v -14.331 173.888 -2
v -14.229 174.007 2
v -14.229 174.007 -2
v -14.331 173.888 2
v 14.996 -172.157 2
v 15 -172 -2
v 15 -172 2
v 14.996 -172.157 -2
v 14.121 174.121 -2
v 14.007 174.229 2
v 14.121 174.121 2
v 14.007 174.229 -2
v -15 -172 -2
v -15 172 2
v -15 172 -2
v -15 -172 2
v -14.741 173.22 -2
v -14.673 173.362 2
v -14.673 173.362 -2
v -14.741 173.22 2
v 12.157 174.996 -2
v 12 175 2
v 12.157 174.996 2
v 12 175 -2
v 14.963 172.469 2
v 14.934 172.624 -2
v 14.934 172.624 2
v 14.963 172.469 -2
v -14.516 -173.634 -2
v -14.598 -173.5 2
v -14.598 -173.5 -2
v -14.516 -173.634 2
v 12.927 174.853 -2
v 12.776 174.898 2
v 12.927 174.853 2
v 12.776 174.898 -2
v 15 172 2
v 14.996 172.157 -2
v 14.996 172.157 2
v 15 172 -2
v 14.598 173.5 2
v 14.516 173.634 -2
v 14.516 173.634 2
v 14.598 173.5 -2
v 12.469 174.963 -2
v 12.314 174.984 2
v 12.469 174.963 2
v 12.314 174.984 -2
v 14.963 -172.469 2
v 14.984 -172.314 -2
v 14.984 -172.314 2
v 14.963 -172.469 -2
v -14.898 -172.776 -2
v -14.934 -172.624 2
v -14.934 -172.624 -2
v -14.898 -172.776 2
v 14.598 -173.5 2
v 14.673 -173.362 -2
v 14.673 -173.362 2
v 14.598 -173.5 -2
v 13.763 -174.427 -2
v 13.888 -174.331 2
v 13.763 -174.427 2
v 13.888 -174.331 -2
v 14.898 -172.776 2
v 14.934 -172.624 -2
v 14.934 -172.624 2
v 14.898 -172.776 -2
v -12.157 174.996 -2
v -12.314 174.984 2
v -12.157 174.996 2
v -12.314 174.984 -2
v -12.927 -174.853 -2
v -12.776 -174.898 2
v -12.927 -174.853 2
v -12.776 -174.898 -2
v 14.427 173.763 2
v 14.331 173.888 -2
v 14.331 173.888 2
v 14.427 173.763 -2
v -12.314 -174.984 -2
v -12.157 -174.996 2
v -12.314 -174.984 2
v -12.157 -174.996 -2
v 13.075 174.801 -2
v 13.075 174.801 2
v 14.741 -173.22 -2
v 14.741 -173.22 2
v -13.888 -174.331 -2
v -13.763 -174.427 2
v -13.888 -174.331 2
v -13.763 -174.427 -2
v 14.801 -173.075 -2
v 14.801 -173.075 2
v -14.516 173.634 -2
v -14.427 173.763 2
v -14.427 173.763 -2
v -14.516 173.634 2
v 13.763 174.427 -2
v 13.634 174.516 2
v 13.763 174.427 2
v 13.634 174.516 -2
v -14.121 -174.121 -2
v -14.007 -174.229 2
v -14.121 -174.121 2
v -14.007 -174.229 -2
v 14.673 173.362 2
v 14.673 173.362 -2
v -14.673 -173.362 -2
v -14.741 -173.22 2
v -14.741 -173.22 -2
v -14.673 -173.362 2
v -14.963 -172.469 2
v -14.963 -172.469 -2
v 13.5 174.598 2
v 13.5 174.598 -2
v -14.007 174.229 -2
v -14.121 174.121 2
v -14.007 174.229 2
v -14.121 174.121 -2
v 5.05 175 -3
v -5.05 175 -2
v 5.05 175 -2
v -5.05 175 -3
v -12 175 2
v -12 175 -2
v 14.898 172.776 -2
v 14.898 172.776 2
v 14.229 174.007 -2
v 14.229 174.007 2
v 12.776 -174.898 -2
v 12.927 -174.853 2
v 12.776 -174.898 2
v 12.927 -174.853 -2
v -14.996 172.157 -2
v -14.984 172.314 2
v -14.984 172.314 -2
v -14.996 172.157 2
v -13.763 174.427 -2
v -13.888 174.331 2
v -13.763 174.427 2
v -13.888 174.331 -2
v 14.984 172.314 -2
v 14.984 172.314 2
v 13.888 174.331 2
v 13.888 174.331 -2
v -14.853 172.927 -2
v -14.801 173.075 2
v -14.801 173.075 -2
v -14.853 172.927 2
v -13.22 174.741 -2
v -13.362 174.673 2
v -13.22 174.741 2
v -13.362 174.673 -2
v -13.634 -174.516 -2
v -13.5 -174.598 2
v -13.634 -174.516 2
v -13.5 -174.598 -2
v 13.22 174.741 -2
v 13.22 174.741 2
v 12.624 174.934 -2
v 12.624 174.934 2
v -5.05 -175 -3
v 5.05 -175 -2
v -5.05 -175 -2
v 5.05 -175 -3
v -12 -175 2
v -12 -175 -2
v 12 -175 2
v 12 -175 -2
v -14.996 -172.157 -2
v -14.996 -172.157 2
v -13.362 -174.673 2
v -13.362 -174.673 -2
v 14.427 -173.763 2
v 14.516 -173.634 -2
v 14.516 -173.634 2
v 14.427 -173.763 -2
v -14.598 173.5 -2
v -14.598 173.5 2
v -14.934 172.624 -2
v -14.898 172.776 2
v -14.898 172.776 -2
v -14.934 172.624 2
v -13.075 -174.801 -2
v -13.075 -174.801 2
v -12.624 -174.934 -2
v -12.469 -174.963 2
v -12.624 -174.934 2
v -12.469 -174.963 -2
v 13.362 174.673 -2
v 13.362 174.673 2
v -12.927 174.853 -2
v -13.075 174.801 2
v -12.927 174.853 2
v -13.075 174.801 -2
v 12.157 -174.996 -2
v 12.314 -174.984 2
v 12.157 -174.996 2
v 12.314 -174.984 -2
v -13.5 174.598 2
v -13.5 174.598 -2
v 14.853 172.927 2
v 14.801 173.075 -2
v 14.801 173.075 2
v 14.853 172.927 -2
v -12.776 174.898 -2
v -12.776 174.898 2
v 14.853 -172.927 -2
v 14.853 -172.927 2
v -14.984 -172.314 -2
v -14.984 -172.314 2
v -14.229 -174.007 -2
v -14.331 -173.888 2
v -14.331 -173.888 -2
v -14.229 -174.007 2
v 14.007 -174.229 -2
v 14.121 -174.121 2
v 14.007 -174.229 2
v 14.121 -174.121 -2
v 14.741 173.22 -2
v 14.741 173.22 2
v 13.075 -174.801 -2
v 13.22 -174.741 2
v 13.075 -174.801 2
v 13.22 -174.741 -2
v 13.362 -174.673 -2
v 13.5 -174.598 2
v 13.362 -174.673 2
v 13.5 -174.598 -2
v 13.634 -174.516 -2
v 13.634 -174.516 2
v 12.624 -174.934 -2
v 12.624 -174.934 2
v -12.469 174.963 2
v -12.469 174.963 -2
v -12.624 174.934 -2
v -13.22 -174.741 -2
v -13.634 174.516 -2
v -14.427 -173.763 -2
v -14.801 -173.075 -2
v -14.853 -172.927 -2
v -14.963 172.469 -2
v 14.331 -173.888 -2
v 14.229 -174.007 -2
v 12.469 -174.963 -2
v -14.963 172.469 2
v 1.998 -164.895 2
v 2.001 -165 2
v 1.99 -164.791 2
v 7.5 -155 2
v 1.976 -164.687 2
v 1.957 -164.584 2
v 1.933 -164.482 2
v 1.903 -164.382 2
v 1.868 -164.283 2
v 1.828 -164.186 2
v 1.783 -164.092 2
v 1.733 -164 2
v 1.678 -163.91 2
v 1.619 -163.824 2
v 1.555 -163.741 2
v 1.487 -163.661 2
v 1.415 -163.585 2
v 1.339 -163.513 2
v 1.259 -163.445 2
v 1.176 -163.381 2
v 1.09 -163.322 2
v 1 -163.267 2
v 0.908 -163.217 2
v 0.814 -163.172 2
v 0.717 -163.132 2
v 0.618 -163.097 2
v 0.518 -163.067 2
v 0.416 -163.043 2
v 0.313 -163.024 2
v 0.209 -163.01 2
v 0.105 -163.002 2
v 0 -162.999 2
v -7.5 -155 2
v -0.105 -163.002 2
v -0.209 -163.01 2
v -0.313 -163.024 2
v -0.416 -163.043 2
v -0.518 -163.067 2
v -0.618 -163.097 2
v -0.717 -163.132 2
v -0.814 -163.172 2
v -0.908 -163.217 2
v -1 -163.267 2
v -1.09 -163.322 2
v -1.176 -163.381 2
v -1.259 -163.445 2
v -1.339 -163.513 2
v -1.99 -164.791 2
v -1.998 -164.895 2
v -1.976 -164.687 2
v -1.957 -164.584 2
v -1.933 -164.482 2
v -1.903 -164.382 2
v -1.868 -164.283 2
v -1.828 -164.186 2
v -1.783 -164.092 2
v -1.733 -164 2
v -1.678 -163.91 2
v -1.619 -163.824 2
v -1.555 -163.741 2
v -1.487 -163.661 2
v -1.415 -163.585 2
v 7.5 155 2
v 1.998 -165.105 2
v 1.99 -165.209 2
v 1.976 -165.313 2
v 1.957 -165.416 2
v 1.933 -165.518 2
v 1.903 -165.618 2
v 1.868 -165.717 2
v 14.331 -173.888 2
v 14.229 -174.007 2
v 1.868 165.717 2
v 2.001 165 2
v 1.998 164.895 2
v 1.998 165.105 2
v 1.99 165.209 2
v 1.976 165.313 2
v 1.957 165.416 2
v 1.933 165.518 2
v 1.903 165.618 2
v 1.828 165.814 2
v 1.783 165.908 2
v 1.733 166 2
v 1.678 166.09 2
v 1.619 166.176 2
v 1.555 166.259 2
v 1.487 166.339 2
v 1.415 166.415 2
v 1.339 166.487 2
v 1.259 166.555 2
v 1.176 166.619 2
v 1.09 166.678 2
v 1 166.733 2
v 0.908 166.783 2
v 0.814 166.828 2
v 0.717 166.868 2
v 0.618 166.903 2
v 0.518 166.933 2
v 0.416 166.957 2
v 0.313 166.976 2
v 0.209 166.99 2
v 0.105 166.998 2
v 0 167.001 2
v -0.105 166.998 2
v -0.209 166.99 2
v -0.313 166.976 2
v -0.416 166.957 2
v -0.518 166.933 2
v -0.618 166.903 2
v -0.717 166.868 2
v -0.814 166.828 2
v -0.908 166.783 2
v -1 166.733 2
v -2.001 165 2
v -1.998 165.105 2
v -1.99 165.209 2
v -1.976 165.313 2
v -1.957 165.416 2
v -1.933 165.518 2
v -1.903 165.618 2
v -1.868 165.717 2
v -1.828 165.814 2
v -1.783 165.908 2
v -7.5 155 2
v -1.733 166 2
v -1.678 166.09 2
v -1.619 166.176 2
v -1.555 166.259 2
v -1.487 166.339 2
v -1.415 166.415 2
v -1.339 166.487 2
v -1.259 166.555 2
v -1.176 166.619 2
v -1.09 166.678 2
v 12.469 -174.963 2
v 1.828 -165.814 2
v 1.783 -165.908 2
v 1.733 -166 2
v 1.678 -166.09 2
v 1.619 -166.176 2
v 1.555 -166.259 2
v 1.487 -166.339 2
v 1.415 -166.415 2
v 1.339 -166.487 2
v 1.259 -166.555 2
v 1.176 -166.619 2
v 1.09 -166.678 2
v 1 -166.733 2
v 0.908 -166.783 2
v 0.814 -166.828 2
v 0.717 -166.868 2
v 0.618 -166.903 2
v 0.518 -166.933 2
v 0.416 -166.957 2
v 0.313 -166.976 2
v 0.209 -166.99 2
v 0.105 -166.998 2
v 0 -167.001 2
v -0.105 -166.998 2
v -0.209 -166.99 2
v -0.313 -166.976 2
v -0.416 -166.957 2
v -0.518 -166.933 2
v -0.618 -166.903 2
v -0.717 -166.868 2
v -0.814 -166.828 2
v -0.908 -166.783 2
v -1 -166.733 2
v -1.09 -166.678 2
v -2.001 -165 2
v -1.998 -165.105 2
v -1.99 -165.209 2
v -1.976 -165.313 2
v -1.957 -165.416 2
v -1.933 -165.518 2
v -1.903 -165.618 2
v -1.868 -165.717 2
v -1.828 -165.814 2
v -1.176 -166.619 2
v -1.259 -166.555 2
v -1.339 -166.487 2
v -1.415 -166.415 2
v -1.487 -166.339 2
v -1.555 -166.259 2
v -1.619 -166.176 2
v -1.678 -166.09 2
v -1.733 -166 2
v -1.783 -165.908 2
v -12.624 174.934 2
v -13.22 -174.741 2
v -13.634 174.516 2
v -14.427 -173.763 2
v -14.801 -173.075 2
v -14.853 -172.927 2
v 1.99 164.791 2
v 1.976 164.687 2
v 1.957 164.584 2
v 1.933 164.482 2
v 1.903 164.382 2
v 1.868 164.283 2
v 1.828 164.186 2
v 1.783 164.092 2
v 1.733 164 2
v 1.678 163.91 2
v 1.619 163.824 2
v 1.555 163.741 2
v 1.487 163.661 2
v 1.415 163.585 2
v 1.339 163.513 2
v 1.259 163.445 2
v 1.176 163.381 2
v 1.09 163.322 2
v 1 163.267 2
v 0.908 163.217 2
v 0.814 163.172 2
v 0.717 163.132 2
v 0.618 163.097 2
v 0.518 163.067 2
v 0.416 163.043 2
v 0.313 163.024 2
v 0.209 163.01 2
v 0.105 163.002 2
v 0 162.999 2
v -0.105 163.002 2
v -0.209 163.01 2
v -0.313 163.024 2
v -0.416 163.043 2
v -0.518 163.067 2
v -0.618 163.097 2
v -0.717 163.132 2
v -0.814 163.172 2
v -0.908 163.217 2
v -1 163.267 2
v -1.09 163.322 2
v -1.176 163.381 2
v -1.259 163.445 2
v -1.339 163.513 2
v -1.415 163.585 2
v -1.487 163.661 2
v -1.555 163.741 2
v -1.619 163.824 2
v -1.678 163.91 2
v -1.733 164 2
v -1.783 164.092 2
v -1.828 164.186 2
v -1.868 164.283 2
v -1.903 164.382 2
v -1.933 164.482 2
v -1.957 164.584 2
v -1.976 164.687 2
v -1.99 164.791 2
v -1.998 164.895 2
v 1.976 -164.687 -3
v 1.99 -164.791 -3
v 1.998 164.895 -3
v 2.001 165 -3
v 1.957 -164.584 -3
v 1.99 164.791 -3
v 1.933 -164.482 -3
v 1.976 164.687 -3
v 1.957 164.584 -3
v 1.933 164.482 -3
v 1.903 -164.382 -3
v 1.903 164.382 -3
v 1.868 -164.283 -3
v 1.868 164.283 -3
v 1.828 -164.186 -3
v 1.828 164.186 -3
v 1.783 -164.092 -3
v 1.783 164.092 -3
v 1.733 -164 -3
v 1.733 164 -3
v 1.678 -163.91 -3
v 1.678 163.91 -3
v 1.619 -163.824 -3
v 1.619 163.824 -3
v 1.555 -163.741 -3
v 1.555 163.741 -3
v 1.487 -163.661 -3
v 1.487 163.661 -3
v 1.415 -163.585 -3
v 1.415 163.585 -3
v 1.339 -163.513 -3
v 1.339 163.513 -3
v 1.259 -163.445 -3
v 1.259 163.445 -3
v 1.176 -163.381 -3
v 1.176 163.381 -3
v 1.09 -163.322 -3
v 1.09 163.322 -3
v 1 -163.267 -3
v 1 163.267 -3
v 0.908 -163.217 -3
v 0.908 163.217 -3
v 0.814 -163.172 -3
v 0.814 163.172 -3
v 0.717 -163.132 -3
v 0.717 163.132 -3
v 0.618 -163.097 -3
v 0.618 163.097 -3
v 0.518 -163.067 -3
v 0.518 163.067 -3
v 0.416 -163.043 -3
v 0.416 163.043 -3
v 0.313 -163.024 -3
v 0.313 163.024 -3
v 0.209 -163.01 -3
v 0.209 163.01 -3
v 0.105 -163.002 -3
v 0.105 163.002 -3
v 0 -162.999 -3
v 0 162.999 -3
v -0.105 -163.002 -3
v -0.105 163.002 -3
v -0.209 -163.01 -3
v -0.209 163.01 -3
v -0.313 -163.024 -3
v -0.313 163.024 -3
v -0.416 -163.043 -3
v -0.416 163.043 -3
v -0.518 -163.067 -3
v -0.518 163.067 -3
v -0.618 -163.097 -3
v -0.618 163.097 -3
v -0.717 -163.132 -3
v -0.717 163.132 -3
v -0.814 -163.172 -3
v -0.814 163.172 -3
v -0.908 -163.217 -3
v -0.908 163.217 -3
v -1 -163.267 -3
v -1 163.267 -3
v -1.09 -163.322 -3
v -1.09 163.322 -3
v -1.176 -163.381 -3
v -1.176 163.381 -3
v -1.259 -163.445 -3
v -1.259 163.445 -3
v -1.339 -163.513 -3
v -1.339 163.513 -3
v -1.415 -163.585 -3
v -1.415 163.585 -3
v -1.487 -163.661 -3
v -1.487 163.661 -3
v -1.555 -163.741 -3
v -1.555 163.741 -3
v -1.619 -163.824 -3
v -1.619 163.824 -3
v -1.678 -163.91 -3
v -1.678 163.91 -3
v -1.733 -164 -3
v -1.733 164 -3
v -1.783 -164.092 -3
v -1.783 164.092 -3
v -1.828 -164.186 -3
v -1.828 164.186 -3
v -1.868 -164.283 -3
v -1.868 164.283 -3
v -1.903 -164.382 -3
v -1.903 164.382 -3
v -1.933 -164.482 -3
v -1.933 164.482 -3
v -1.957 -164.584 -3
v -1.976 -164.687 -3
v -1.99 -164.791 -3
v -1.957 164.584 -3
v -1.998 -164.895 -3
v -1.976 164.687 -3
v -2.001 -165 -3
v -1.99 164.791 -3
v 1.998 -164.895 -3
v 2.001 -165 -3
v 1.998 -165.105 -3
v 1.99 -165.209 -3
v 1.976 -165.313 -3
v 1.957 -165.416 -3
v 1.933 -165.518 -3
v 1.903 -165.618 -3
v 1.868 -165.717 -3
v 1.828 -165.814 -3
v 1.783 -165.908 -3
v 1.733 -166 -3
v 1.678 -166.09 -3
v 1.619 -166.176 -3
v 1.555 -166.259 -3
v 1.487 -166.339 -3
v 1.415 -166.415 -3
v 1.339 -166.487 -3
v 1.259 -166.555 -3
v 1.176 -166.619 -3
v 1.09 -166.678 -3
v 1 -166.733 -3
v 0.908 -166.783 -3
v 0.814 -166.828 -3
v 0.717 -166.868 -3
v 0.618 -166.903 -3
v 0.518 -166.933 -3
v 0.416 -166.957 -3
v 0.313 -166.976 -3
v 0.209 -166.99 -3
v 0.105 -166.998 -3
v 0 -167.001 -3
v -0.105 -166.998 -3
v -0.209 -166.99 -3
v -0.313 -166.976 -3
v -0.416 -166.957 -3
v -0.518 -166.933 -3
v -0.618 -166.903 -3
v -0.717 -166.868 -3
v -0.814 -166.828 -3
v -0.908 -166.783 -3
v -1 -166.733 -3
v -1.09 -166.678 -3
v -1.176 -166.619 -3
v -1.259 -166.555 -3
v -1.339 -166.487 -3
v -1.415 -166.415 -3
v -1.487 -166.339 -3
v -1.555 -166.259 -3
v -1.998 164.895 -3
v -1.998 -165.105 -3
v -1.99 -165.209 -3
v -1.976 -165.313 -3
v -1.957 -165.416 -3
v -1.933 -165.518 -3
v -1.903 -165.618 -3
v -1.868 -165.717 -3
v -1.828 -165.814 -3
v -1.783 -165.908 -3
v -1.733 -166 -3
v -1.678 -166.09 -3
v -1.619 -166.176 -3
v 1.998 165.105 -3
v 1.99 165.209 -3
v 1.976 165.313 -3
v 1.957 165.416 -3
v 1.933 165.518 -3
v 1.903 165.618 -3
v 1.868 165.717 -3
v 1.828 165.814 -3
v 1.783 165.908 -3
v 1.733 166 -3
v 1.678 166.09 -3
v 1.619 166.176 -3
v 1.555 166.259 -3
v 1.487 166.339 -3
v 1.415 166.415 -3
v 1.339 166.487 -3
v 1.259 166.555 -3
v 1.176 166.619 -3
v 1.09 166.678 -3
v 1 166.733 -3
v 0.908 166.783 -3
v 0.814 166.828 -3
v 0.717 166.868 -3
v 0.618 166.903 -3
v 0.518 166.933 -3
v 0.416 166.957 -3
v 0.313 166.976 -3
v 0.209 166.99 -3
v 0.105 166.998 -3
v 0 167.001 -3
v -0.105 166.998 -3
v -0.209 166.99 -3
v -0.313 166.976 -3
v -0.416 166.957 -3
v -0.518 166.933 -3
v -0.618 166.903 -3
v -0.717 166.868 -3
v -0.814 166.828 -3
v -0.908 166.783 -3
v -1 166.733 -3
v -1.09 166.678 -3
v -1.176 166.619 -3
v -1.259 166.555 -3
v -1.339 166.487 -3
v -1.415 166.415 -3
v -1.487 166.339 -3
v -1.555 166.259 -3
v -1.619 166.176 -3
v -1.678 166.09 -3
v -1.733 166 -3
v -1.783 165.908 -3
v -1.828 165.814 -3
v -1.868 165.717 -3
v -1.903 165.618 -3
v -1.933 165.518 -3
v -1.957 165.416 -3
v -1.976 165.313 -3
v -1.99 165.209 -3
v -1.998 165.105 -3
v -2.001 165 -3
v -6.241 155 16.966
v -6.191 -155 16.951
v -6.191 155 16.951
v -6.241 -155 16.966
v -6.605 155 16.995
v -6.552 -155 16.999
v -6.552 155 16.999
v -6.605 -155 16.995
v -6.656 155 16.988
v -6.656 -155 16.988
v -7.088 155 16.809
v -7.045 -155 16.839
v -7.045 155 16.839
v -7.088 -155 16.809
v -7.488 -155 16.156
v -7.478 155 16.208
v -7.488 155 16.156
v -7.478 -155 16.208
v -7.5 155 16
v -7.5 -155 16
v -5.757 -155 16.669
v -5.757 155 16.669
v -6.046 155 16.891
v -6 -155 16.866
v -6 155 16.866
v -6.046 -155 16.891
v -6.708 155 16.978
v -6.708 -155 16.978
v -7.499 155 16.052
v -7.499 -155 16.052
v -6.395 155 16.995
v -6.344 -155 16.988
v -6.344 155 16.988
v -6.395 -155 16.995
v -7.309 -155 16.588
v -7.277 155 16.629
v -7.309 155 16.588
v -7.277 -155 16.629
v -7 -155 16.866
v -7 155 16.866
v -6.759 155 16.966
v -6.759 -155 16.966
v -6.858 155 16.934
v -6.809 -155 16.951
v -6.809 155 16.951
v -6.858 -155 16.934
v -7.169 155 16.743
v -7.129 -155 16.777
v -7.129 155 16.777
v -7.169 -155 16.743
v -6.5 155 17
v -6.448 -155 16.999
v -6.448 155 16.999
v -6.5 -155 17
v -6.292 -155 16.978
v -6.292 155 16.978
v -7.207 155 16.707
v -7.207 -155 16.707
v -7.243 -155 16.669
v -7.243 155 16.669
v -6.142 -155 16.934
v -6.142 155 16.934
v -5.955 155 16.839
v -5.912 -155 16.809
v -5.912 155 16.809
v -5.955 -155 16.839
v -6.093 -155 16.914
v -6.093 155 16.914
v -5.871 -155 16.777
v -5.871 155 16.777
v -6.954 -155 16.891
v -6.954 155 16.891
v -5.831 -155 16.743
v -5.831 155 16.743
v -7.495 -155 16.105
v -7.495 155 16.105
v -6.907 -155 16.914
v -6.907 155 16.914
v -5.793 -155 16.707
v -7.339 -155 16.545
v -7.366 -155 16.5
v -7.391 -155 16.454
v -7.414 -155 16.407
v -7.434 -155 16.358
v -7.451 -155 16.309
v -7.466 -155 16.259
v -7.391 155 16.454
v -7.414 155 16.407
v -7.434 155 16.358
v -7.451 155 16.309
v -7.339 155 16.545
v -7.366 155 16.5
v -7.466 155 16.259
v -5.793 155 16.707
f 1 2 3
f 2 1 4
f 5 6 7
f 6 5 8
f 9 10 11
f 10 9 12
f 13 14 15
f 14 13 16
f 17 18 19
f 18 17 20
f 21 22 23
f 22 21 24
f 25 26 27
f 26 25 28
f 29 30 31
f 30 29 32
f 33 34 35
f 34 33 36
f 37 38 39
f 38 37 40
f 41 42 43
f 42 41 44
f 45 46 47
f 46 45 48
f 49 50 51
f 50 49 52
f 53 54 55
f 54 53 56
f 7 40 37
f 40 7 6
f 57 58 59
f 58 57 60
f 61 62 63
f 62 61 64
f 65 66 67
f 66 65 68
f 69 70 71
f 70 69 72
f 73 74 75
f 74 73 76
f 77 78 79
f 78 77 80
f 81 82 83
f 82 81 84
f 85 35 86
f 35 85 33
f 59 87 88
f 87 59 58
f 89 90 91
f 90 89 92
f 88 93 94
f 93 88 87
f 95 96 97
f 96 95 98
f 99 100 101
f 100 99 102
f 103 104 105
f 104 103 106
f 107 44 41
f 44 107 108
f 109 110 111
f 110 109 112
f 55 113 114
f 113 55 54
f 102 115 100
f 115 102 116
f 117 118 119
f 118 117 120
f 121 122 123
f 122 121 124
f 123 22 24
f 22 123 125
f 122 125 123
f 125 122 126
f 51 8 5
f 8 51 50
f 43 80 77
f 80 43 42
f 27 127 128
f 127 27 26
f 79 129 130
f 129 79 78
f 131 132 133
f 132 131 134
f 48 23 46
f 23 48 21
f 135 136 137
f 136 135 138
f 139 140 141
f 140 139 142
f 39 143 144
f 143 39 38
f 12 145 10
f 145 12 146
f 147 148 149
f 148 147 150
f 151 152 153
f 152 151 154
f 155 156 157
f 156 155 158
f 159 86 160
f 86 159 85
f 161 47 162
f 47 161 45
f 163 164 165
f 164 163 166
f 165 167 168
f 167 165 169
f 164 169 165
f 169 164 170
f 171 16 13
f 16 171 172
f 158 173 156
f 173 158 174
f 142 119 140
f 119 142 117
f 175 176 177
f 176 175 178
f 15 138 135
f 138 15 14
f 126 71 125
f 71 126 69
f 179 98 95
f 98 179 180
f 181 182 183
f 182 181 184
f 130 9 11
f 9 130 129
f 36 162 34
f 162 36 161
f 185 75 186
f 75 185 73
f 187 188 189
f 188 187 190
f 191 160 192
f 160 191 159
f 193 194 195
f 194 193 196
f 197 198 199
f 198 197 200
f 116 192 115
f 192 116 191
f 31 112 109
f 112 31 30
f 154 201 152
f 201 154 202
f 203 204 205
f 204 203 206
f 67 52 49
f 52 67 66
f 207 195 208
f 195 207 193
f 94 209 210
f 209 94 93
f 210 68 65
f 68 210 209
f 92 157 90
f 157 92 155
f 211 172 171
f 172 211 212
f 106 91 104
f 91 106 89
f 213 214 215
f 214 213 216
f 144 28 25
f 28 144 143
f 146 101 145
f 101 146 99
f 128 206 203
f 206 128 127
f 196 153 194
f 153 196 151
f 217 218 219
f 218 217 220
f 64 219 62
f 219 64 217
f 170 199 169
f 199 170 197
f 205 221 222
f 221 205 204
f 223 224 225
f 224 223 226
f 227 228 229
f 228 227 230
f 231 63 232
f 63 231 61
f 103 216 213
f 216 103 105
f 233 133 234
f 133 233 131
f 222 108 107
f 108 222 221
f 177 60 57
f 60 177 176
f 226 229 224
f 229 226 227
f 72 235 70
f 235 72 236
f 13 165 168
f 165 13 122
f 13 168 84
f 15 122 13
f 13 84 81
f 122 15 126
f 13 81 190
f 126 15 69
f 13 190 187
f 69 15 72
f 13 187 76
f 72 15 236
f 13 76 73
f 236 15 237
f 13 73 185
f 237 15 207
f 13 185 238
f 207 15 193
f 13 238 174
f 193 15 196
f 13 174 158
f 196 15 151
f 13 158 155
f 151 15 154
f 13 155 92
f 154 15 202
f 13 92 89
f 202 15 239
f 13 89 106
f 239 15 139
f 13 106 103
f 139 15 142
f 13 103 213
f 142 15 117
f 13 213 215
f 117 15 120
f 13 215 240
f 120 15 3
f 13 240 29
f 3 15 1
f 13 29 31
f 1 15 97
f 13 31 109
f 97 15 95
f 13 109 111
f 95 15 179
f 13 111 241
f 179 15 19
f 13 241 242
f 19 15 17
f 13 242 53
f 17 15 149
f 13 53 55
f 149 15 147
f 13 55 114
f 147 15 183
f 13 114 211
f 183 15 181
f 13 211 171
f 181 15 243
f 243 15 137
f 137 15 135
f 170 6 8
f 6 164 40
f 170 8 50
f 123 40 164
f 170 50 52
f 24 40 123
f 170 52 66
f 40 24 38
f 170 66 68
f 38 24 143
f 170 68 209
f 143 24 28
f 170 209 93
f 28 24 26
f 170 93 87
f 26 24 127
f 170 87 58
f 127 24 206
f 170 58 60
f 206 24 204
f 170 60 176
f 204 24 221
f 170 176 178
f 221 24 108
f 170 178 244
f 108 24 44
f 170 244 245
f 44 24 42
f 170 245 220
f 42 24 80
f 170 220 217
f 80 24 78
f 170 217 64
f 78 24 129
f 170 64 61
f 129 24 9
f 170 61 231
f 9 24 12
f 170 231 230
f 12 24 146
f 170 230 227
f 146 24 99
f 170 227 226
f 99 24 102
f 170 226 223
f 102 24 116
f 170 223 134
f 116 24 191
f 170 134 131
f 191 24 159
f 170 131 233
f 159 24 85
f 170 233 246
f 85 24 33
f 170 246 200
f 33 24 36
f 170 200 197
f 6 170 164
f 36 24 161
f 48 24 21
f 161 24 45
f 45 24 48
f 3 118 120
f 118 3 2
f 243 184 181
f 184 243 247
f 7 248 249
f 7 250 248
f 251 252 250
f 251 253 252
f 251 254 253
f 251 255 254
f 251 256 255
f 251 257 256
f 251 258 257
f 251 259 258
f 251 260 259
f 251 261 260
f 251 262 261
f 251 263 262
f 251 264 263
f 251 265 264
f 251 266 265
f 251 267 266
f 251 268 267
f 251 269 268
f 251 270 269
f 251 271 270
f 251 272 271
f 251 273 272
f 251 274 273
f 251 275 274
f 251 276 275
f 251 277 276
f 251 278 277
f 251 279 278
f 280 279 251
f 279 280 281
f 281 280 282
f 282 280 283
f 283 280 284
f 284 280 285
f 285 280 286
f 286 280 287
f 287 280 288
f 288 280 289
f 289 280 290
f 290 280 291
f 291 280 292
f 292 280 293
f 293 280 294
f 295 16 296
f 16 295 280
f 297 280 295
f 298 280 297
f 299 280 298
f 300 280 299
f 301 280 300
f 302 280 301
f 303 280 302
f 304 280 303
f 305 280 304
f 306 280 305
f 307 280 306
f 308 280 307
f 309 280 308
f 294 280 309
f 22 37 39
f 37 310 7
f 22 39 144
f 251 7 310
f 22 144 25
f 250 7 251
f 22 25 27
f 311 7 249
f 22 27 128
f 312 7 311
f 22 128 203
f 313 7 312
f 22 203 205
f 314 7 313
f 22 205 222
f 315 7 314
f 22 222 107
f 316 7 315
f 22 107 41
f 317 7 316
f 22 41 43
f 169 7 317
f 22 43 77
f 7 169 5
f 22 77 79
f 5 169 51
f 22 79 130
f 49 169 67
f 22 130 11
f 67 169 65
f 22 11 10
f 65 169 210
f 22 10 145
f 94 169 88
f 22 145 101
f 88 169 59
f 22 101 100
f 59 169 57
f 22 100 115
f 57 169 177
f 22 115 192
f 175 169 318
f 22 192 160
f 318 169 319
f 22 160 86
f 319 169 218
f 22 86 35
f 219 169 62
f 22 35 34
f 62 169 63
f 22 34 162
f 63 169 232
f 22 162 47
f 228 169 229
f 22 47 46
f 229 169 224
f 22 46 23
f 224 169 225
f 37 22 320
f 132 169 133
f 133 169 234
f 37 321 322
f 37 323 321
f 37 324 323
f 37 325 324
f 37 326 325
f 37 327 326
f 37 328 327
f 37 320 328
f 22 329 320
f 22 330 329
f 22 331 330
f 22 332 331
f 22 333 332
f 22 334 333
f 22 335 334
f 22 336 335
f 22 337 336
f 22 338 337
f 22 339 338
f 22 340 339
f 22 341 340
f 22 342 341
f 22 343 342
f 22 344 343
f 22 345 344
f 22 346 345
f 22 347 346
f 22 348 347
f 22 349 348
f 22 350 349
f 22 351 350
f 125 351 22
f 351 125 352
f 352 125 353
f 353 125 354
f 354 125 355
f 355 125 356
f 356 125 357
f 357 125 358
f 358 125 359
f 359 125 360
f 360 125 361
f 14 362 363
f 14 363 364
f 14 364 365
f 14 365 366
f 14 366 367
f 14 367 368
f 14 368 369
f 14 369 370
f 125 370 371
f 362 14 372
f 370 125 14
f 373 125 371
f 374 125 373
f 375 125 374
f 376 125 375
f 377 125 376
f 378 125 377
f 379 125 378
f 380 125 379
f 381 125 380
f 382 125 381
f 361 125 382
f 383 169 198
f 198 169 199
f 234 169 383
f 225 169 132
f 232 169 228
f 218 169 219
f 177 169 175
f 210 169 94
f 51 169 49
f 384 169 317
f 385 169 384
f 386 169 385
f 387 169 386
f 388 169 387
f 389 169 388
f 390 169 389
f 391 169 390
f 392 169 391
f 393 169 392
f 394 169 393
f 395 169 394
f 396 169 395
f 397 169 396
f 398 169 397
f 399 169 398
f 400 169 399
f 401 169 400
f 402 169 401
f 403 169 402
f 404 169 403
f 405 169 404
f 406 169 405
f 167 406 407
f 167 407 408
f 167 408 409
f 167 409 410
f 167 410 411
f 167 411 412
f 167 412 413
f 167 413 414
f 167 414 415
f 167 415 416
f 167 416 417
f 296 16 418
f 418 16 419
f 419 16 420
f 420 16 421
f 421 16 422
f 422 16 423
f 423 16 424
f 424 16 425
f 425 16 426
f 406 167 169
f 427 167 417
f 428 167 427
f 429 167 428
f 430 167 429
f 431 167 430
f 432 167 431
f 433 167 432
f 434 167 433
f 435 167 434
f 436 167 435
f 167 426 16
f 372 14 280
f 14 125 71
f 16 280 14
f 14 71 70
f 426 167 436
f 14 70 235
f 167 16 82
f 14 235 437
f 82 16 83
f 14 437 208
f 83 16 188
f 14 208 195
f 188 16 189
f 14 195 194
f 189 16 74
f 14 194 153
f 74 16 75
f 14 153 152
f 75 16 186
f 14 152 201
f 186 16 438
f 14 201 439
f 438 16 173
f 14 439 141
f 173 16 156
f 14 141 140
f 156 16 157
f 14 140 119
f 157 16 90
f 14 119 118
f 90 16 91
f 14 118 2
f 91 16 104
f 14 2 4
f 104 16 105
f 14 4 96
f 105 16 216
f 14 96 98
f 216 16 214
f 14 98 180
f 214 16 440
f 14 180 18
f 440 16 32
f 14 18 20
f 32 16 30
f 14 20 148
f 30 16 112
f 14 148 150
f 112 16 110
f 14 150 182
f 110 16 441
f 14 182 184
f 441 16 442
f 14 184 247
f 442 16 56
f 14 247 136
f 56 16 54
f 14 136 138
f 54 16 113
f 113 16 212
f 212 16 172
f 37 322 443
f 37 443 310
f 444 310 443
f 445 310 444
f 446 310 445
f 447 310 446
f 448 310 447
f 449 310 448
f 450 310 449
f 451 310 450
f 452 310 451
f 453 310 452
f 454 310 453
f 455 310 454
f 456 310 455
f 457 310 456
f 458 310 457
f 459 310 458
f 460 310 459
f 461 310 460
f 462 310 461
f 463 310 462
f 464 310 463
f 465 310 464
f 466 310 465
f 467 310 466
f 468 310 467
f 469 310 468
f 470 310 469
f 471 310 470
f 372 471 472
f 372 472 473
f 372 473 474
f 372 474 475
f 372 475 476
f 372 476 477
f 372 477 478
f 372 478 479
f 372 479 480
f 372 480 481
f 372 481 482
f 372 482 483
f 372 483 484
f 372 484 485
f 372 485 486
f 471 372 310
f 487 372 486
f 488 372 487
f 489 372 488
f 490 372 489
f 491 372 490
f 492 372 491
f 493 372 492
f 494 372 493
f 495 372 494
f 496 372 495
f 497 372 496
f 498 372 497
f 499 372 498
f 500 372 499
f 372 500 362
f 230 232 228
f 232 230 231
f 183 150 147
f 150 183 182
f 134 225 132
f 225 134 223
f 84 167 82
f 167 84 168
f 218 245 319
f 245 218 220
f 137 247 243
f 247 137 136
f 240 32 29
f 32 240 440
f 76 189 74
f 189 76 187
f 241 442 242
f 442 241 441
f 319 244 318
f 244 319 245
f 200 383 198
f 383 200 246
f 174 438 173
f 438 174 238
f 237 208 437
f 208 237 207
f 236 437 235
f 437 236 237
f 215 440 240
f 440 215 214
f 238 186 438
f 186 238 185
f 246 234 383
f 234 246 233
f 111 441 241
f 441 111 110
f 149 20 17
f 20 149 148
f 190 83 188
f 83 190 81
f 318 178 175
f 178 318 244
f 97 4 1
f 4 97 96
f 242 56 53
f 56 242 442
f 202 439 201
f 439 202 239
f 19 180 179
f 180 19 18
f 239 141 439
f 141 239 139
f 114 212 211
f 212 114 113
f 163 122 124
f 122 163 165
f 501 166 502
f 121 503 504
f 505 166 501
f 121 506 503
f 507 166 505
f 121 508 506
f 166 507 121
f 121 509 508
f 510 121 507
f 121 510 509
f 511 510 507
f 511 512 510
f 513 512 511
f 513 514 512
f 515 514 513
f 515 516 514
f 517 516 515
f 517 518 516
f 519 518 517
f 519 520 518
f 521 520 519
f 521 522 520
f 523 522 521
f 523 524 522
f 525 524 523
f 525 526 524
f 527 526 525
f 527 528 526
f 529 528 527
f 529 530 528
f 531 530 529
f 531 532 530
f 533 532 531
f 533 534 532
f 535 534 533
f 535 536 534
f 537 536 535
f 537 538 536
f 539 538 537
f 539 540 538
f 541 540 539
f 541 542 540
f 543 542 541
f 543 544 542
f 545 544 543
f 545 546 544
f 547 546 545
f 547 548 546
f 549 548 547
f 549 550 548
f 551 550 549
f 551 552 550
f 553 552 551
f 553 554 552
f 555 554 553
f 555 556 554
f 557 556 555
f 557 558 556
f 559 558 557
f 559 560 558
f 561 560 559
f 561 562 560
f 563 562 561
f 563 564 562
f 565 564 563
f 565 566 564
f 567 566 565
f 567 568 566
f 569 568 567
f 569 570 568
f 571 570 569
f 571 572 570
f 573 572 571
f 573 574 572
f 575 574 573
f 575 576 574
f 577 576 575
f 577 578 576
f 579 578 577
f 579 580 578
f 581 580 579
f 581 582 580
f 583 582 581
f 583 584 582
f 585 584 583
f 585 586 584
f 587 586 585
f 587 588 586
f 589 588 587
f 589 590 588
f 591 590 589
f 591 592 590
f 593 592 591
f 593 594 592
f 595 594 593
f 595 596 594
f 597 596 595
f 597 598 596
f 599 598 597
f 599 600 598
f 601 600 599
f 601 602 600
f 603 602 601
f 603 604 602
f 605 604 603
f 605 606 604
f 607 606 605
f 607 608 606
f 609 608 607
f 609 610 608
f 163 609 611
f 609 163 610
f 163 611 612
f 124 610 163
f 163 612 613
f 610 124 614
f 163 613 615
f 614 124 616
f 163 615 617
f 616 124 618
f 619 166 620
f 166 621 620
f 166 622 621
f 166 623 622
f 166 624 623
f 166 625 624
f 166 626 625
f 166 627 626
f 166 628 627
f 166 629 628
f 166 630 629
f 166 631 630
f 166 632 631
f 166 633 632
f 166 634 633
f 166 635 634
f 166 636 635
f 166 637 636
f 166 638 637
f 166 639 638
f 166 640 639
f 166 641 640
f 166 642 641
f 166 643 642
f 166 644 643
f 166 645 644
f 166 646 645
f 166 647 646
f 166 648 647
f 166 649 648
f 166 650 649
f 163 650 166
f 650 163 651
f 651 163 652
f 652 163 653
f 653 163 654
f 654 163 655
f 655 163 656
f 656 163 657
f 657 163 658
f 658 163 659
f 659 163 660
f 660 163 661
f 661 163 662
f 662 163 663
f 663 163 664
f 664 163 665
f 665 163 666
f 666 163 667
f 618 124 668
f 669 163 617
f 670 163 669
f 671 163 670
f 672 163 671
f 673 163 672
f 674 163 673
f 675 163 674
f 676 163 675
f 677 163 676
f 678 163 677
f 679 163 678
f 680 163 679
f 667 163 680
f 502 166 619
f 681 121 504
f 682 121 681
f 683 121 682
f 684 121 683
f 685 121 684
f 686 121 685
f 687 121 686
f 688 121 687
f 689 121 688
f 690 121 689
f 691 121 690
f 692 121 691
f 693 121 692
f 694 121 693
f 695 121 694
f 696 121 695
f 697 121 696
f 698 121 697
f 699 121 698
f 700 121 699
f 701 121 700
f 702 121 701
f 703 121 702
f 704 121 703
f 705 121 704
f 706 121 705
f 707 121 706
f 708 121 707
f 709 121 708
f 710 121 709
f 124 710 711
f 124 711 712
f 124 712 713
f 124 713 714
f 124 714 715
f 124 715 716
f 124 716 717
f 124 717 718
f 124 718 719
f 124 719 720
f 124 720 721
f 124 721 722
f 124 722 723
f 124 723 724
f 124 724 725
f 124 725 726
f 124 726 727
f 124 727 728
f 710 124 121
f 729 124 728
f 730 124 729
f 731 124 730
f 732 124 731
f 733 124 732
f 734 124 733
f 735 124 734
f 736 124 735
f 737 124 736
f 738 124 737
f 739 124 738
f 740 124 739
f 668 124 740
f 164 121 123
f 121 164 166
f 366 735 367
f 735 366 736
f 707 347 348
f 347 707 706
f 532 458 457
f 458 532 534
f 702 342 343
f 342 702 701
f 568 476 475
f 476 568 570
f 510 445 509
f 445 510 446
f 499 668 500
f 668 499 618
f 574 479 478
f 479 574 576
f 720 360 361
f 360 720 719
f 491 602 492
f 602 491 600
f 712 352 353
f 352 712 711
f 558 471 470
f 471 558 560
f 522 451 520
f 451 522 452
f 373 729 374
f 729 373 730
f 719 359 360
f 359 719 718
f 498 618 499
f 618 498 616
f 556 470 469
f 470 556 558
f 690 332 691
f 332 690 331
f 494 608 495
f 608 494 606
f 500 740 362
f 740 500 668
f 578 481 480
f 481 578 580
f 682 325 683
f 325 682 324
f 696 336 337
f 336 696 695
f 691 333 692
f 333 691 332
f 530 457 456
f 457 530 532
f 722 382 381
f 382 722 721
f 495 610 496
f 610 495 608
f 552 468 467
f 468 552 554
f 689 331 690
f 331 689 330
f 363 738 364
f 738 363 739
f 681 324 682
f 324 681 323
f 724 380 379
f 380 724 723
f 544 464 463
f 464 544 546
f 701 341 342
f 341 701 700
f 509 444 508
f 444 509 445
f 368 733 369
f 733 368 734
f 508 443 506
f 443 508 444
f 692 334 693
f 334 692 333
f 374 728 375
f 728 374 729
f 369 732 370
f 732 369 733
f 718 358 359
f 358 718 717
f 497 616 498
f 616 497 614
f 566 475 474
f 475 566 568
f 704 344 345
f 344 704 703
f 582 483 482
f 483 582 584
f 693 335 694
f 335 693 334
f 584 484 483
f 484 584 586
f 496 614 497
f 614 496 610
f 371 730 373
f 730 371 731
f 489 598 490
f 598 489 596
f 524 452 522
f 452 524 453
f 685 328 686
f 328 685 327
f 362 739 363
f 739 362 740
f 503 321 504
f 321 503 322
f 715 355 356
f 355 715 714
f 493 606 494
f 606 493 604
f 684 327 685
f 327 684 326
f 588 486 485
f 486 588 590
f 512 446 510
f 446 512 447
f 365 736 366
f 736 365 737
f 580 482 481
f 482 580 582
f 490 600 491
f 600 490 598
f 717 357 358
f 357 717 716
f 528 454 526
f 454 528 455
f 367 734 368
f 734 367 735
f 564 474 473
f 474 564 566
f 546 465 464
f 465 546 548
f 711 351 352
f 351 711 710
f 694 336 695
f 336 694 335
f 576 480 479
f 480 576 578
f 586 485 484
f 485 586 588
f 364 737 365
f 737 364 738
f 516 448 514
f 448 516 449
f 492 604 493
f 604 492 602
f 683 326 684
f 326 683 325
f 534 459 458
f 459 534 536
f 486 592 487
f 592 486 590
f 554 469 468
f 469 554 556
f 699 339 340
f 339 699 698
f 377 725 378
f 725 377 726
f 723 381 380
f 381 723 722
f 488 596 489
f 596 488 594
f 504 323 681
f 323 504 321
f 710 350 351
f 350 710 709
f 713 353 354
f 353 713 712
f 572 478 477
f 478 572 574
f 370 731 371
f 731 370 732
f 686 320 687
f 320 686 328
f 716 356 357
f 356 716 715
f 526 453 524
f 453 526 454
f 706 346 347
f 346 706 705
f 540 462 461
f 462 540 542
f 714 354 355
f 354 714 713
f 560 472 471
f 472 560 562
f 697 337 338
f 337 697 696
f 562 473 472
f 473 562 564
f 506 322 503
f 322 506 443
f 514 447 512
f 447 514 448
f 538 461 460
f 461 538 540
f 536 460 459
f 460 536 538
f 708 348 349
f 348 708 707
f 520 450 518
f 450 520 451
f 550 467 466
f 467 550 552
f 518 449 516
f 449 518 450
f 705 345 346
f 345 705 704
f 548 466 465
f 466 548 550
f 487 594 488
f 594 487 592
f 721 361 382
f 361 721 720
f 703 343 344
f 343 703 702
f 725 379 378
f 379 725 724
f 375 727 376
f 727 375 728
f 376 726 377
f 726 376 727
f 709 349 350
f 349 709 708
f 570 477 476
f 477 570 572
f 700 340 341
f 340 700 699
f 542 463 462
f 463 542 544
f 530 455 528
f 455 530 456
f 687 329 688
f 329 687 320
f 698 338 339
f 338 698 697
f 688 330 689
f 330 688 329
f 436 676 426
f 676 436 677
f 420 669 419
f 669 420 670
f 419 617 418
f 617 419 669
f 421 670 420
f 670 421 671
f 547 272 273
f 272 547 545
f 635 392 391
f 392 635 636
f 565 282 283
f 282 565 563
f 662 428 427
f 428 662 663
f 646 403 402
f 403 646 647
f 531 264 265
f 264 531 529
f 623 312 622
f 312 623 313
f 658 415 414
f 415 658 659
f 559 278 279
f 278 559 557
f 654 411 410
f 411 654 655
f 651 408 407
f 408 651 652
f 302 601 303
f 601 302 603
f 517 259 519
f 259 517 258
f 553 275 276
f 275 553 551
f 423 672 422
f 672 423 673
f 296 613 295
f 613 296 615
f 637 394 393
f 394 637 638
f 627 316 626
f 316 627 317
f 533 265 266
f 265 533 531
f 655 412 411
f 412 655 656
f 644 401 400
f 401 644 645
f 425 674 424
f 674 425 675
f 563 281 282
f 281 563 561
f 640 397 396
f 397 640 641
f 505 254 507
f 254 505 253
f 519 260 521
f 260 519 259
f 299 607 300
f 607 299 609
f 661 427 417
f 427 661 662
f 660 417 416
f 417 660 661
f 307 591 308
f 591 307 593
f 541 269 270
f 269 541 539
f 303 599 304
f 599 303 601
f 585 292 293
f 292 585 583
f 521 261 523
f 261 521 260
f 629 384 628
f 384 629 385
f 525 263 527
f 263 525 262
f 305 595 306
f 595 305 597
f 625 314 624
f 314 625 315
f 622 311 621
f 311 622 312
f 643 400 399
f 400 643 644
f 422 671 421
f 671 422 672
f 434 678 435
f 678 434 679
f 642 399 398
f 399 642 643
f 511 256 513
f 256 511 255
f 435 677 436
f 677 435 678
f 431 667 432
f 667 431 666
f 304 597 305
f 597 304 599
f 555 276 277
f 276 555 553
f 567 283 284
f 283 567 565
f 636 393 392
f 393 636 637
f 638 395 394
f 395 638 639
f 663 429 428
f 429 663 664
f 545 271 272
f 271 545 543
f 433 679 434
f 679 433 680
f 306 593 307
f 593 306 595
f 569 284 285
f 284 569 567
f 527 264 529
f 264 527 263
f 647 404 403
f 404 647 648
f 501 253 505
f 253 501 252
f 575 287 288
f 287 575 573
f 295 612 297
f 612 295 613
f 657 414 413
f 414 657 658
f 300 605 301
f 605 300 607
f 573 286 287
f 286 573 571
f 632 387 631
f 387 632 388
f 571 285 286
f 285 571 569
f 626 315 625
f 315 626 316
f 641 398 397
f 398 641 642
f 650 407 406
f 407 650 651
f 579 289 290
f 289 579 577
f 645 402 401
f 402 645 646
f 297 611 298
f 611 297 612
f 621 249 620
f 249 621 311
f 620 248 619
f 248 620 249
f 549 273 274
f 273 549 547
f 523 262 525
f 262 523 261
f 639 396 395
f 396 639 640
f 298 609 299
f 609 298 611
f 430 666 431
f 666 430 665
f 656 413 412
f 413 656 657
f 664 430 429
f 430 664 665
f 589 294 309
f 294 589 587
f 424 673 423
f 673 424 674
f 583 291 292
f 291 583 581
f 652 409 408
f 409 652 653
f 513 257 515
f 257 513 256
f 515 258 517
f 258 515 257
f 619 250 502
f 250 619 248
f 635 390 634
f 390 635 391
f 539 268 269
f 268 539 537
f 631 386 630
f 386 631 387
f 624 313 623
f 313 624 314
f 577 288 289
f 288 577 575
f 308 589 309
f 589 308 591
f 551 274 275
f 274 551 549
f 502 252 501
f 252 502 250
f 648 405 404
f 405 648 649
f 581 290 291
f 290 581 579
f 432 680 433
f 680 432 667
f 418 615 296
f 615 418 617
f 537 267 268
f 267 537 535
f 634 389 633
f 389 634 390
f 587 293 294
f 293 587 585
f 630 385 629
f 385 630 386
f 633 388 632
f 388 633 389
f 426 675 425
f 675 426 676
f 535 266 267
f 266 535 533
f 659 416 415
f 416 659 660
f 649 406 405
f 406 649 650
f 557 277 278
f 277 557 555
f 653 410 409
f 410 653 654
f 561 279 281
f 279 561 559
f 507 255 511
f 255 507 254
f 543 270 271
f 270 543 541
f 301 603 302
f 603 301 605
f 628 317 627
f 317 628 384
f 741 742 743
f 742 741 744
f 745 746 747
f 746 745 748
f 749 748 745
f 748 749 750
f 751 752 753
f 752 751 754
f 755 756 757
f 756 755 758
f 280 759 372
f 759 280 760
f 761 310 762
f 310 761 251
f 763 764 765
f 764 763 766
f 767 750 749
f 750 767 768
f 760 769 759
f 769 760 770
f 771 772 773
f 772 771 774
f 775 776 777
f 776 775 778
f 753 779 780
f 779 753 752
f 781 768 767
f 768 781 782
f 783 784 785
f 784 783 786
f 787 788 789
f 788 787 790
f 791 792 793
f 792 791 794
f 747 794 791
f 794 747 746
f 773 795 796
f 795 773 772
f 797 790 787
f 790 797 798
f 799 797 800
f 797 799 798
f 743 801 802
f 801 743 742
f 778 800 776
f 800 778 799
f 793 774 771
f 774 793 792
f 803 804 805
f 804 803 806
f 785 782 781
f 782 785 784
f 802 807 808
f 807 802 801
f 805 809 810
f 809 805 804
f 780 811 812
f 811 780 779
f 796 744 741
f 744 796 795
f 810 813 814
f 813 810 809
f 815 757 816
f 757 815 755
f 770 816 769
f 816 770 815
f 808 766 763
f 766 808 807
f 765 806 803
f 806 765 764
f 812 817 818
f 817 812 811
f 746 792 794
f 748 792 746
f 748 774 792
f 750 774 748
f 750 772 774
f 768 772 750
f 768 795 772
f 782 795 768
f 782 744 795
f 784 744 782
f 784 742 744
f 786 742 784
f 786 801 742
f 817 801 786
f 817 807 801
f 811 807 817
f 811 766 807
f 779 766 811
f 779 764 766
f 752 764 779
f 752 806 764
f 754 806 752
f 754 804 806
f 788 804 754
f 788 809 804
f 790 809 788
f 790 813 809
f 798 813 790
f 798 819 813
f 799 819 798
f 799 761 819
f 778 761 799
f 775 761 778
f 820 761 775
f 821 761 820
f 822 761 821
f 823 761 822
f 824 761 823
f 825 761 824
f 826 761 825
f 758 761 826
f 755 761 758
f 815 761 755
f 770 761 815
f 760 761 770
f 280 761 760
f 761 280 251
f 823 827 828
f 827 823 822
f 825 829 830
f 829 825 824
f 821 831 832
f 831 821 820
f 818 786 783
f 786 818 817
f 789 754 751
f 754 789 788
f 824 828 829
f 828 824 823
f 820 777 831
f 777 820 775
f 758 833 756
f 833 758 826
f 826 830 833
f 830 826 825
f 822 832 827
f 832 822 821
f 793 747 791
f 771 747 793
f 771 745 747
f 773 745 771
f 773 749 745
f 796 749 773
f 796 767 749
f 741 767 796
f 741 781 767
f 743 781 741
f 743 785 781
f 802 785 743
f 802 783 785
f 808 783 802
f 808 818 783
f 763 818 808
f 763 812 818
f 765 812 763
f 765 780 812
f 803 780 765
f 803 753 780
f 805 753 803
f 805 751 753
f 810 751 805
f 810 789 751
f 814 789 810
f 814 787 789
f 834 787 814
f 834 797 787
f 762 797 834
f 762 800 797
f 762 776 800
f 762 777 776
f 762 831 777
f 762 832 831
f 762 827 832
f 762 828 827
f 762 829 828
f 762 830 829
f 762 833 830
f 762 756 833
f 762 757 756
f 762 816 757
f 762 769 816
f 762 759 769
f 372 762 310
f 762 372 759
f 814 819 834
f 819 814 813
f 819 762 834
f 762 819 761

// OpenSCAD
// Customizable LED strip extrusion mount
// Copyright: Olle Wreede 2020
// License: CC BY-SA

//CUSTOMIZER VARIABLES

// Width of extrusion profile
extrusion_width = 30; // [20:20 mm, 30:30 mm]

// Slot mount option
extrusion_slot_mount = 1; // [0:None, 1:Slot Ridge]

// Width in mm of bracket
bracket_width = 30; // [15:1:60]

// Length in mm of bracket
bracket_length = 350; // [150:10:500]

// Thickness in mm of bracket
bracket_thickness = 4; // [2:0.5:6]

// Radius in mm of bracket corners
bracket_corner_diameter = 3; // [1:0.5:5]

// Width in mm of LED wedge
led_wedge_width = 15; // [10:20]

// Height in mm of LED wedge
led_wedge_height = 15; // [5:20]

// Width in mm of cutoff of top of wedge
led_wedge_corner_diameter = 2; // [0:0.2:5]

// Diameter in mm of mount screw holes
mount_hole_diameter = 4; // [0:None, 3:M3, 4:M4, 5:M5, 6:M6]

// Distance in mm of mount holes from edge
mount_hole_distance = 10; // [4:0.5:10]

//CUSTOMIZER VARIABLES END

/* [Hidden] */

// 3030 slot
// 8.2mm slot hole width
// 16.5 slot width
// 2mm thickness

// 2020 slot
// 6.2 mm slot hole width
// 11 mm slot width
// 1.8 thickness

// TODO:
// * Add snap fit mounting option

$fn=120;

// slot_width = (extrusion_width == 30) ? 8 : 6;
// slot_thickness = (extrusion_width == 30) ? 2 : 1.8;

extrusion_slot_width = (extrusion_width == 30) ? 10.1 : 6.9;
extrusion_slot_thickness = (extrusion_width == 30) ? 1 : 0.5; 

/* Helper modules */

module cylinder_outer(diameter, height, fn) {
   fudge = 1 / cos(180 / fn);
   cylinder(h=height, r=diameter / 2 * fudge, $fn=fn, center=true);
}

module cube_rounded(width, height, thickness, radius=1) {
	minkowski() {
		cube([width - 2 * radius, height - 2 * radius, thickness/2], center = true);
		cylinder(r = radius, h = thickness/2, center = true);
	}
}

/* Mount */

module mount_holes(hole_diameter, hole_distance, hole_depth) {
    translate([hole_distance / 2, 0, 0])
    rotate([0, 0, 90])
    cylinder_outer(hole_diameter, hole_depth, $fn);
    
    translate([-hole_distance / 2, 0, 0])
    rotate([0, 0, 90])
    cylinder_outer(hole_diameter, hole_depth, $fn);
}

module slot_ridge(height, thickness, slot_width, slot_thickness) {
    rotate([0, 0, 90])
    translate([- height / 2, -slot_width / 2, - thickness / 2 - slot_thickness])
    cube([height, slot_width, slot_thickness]);
}

module mount_bracket(width, height, thickness, corner_diameter, hole_diameter, hole_distance, slot_width, slot_thickness) {
    difference() {
        union() {
            cube_rounded(width, height, thickness, corner_diameter);
        
            if (slot_thickness > 0) {
                slot_ridge(height, thickness, slot_width, slot_thickness);
            }
        }
        
        // Mount holes
        if (hole_diameter > 0) {
            hole_depth = thickness + slot_thickness;
            rotate([0, 0, 90])
            translate([0, 0, - slot_thickness / 2])
            #mount_holes(hole_diameter, height - hole_distance * 2, hole_depth);
        }
    }
}

module led_wedge(width, height, length, corner_diameter) {
    translate([width / 2, length / 2, 0])
    rotate([90, 270, 0])
    linear_extrude(height=length)
    hull() {
        polygon(points=[
            [0, 0],
            [0, width],
            [height - corner_diameter / 2, width],
            [height - corner_diameter / 2, width - corner_diameter]
        ]);
        translate([height - corner_diameter / 2, width - corner_diameter/2, 0])
        #circle(d = corner_diameter, center=true);
    }
}

module led_strip_mount() {
    union() {
        mount_bracket(
            bracket_width,
            bracket_length,
            bracket_thickness,
            bracket_corner_diameter,
            mount_hole_diameter,
            mount_hole_distance,
            extrusion_slot_width,
            extrusion_slot_mount > 0
                ? extrusion_slot_thickness
                : 0);
        
        translate([0, 0, bracket_thickness / 2])
        led_wedge(
            led_wedge_width,
            led_wedge_height,
            bracket_length - mount_hole_distance * 4,
            led_wedge_corner_diameter);
    }
}

led_strip_mount();
